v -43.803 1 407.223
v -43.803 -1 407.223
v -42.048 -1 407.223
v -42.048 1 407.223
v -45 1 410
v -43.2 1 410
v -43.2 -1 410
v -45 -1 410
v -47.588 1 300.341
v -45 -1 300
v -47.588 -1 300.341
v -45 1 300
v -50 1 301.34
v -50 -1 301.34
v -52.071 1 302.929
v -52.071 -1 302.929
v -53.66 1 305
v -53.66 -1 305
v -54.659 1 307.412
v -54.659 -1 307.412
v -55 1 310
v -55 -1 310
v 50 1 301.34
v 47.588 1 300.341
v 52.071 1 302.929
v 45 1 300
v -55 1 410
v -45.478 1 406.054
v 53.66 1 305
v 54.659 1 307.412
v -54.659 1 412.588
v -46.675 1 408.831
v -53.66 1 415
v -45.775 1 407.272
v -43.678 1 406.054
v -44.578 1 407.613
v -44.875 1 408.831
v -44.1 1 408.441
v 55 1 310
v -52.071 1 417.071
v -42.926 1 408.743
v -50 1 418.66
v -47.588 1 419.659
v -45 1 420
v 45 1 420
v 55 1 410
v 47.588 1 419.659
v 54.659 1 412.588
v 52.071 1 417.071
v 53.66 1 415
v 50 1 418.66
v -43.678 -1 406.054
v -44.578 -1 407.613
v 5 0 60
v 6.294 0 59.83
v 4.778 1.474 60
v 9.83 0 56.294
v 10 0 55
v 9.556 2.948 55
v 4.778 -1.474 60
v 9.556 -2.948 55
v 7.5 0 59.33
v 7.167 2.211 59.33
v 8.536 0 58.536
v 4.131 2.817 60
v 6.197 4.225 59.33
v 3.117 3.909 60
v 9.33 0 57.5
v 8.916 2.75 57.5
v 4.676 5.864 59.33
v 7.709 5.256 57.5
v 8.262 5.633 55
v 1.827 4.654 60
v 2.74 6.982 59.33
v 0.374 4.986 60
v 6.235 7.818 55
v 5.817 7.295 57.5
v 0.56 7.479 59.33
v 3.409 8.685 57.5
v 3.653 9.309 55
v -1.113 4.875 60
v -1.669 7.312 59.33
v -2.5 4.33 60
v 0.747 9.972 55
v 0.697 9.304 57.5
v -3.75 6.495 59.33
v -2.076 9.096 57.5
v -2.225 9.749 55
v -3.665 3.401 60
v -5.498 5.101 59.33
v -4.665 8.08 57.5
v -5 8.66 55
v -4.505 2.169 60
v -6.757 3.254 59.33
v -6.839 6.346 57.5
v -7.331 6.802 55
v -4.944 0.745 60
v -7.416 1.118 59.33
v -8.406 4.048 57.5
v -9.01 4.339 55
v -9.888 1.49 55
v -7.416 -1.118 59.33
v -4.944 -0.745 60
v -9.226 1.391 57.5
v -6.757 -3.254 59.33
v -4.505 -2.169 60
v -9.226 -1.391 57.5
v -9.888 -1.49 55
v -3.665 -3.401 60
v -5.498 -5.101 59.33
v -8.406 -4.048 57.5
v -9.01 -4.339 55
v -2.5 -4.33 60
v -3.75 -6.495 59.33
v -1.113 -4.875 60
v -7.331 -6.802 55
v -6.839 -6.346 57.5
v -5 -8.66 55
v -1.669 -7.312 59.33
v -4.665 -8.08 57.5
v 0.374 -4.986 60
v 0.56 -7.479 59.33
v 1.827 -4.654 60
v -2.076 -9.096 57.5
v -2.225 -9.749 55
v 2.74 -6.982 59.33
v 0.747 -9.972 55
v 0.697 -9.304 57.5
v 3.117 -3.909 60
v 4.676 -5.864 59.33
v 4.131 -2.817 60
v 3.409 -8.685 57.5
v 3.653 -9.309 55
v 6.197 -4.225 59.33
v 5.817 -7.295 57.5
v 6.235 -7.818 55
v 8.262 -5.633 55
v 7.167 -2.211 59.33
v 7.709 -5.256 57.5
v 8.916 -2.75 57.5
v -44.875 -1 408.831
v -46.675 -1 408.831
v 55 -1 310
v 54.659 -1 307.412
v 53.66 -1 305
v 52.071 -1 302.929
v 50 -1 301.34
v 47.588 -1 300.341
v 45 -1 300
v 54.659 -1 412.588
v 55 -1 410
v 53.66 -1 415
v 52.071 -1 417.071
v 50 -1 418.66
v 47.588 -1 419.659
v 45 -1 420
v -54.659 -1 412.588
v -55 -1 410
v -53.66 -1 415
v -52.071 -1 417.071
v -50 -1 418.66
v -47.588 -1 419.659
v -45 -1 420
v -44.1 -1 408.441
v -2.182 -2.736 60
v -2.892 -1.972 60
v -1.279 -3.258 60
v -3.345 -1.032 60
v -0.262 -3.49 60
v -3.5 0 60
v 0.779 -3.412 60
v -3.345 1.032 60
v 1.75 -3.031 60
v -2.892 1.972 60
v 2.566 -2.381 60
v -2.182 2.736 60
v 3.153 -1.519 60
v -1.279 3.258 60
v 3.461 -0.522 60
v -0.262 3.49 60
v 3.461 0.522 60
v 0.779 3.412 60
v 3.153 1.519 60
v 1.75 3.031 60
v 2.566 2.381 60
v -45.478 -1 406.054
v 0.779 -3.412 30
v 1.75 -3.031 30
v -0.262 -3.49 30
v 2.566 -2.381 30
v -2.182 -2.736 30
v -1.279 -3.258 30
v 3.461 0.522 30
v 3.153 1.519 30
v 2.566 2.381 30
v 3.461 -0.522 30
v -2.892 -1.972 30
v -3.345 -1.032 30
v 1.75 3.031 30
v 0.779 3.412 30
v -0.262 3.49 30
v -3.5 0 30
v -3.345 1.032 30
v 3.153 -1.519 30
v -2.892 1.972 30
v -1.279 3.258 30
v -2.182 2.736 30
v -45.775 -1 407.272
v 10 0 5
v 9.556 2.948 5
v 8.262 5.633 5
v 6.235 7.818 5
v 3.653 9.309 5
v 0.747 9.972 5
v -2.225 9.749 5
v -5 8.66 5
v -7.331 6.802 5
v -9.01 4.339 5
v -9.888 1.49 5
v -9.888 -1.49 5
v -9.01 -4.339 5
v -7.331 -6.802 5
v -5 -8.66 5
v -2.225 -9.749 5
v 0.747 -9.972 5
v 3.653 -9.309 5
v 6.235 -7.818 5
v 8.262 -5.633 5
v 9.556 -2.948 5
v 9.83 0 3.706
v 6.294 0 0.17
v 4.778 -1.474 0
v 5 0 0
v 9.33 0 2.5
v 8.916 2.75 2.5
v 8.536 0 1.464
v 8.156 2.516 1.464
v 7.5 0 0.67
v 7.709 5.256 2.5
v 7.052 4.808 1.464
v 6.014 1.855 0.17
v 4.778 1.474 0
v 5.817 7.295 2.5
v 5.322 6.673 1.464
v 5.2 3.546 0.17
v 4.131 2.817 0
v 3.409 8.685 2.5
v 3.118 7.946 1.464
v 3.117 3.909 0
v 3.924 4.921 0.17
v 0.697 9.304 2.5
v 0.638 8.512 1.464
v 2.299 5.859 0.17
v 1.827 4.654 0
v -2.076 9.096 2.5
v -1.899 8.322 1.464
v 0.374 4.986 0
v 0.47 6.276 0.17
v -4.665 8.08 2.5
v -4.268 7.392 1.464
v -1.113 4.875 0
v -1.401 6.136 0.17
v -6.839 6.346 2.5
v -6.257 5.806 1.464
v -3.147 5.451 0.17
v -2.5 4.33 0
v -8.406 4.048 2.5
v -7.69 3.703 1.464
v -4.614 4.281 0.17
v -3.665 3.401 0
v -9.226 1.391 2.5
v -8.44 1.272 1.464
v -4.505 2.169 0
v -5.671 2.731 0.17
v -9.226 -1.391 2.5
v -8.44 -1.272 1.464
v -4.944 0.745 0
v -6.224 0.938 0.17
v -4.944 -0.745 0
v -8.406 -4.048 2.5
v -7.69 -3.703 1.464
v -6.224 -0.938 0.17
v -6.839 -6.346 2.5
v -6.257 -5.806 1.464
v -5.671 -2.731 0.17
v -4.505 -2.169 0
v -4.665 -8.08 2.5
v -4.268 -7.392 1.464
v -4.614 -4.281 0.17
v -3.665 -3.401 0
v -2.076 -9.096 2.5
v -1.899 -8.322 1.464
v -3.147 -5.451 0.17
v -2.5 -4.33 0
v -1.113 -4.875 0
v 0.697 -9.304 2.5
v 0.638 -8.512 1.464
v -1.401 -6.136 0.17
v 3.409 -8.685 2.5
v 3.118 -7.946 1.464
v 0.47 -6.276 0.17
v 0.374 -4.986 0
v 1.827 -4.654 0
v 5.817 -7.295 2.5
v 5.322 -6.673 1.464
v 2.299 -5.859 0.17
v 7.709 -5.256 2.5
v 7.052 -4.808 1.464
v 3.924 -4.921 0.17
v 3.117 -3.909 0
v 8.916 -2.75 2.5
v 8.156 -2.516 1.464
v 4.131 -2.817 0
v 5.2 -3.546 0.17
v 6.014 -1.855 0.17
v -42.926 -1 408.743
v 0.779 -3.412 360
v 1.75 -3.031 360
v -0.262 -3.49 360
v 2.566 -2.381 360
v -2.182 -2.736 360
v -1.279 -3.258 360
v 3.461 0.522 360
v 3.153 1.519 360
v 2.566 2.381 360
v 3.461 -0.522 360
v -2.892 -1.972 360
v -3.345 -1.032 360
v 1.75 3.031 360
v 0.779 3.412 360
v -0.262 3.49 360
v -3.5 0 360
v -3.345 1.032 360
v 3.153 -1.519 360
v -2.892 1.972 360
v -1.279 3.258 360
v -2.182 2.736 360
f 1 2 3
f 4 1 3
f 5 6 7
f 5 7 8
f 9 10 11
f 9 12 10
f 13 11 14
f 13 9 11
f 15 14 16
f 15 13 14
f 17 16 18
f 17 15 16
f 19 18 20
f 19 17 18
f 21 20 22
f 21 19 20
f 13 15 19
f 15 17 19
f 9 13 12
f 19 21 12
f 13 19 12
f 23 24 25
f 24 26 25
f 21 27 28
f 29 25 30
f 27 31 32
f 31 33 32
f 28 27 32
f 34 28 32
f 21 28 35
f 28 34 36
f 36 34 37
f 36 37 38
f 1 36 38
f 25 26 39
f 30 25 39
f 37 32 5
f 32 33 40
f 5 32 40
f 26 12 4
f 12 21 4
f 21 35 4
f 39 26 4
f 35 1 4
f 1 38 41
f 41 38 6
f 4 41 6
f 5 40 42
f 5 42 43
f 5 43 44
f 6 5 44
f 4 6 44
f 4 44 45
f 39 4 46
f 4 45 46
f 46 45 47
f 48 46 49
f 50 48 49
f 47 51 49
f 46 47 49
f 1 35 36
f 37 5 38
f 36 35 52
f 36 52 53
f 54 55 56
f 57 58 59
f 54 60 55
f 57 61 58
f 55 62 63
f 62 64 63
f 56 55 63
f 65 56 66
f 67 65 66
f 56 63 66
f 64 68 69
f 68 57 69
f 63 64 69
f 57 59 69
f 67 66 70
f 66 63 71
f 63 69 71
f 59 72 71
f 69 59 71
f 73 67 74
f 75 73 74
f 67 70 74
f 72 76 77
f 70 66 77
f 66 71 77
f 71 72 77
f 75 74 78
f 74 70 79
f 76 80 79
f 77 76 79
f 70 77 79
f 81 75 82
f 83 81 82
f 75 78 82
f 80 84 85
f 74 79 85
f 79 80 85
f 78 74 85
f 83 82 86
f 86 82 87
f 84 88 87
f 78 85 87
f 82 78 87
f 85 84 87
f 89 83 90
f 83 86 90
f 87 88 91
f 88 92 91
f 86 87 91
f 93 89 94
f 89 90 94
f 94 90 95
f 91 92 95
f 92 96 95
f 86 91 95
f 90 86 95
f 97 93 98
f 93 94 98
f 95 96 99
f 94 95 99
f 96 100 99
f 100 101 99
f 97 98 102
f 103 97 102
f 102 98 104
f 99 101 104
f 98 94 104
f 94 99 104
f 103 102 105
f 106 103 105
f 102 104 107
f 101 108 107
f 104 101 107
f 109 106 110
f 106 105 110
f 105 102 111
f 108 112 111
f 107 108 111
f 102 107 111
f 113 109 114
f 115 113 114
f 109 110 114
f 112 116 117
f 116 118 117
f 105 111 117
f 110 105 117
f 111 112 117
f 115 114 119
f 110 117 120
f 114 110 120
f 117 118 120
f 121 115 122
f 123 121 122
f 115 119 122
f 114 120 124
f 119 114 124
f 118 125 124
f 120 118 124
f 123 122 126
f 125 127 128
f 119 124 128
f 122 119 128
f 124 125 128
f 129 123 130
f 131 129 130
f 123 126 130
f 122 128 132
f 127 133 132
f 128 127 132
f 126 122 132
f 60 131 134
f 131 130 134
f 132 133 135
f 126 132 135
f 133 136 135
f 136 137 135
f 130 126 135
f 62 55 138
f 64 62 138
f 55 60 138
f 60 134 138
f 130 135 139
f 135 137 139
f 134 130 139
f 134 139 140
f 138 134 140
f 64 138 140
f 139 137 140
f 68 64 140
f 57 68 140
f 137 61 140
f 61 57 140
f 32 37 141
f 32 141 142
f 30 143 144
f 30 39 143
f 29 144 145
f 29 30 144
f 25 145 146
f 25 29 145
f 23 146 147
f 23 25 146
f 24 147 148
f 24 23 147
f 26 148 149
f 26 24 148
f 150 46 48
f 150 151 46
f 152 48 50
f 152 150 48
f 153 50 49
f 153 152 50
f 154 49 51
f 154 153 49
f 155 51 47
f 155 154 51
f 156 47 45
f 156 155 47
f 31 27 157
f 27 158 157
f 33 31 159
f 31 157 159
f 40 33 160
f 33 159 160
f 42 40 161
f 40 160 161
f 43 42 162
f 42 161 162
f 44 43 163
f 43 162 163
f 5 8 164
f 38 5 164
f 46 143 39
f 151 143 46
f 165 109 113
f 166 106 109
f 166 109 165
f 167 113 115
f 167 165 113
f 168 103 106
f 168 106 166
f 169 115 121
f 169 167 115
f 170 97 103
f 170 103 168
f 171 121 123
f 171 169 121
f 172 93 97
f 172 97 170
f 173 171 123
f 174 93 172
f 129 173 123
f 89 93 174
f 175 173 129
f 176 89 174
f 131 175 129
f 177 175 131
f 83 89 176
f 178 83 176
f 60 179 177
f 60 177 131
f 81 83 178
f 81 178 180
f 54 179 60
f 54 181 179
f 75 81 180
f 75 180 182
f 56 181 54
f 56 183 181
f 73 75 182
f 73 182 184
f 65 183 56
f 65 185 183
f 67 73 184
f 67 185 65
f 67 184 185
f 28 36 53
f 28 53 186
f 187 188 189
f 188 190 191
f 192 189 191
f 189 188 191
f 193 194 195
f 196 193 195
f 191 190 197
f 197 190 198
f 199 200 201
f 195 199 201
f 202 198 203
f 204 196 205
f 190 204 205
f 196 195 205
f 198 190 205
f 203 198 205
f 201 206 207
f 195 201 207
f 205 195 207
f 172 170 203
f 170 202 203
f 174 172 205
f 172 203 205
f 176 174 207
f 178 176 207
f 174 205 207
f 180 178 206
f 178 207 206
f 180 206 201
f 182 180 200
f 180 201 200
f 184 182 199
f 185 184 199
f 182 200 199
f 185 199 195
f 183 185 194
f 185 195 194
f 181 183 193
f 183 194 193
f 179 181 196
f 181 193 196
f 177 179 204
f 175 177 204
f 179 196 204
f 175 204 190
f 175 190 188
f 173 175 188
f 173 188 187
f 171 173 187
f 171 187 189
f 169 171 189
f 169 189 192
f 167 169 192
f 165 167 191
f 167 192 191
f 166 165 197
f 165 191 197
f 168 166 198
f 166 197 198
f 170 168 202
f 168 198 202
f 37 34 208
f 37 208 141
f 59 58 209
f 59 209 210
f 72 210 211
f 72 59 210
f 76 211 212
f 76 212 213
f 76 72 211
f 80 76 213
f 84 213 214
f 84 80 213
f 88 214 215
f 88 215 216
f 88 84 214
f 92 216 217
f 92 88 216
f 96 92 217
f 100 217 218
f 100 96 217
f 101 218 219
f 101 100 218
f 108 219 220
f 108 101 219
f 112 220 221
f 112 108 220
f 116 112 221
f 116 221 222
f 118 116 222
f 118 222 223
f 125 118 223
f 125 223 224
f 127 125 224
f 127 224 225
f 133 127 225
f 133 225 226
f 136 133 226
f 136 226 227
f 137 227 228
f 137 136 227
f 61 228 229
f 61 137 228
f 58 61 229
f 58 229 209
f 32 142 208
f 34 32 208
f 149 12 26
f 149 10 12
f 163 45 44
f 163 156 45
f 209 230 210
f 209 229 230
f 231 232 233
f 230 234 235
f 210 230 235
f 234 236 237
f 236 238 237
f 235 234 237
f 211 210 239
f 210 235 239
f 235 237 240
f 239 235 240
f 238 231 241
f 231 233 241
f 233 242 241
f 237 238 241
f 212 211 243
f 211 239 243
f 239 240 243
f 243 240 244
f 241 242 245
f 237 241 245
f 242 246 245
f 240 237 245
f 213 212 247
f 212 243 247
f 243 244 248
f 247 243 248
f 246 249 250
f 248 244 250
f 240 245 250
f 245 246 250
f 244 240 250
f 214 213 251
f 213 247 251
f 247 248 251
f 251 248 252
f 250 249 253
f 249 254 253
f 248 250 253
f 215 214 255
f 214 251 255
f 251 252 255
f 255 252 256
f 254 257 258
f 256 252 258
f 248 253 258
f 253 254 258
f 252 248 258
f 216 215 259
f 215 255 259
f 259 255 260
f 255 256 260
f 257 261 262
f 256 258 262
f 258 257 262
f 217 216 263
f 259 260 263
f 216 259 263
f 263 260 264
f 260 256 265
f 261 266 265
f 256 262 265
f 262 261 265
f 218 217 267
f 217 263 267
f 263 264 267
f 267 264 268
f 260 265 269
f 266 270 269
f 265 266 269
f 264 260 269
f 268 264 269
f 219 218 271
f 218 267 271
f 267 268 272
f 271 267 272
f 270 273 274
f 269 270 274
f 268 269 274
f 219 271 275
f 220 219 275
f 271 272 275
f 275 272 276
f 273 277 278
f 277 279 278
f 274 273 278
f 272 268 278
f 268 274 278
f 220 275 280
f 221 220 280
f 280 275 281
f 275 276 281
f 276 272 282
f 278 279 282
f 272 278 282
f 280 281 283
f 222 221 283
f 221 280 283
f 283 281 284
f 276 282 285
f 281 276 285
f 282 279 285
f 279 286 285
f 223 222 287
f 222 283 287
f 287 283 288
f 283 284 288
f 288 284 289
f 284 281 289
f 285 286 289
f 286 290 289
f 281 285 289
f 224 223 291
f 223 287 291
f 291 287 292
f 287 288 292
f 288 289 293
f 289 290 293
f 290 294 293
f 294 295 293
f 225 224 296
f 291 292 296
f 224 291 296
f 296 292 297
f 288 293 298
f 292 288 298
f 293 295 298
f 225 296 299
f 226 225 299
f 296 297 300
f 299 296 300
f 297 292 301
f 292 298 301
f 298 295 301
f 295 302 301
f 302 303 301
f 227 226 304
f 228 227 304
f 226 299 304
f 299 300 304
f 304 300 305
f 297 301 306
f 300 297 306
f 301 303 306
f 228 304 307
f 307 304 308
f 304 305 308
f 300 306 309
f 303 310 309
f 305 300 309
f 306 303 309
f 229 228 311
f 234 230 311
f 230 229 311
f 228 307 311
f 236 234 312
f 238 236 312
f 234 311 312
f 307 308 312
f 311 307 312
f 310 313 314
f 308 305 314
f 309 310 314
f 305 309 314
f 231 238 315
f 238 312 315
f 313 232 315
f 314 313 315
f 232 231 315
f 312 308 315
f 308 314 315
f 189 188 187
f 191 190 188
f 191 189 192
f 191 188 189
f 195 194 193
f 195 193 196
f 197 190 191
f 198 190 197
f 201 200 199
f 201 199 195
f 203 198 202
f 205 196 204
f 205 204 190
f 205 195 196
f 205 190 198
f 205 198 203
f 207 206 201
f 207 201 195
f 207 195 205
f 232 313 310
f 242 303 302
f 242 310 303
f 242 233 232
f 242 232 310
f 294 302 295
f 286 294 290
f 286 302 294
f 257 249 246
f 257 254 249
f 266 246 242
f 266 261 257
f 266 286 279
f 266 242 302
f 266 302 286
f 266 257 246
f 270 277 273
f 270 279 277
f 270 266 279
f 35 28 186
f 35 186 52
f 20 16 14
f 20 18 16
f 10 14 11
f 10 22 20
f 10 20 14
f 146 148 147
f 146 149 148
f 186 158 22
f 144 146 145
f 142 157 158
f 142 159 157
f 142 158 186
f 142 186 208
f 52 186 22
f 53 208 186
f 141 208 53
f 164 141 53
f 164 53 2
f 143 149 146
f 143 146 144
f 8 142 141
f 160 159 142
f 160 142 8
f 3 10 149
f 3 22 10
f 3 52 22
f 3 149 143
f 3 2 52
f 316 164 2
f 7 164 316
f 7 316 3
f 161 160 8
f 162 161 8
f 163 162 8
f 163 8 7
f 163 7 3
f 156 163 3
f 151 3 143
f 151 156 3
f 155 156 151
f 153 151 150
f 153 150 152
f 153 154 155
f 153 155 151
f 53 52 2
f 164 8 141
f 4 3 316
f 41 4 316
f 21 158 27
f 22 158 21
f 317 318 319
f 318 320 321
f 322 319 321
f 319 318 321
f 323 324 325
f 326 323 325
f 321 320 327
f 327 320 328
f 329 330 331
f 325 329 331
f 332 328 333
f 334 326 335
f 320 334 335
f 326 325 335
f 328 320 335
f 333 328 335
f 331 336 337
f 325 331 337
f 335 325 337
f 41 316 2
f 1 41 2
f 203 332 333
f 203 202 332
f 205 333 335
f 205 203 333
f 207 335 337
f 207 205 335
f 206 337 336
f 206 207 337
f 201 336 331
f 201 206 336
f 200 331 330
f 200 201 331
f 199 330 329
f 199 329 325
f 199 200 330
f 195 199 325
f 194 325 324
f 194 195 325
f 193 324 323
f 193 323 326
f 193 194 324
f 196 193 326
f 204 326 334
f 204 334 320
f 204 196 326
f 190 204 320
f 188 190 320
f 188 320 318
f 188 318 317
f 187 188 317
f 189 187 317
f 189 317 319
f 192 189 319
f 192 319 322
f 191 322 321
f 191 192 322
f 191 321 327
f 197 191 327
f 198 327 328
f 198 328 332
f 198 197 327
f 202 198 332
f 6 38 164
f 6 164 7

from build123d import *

# Parameters (mm, degrees)
F0_W     = 3.5
F0_H     = 60
F4_DEPTH = 1
F5_R     = 10
F6_R     = 5
F8_DEPTH = 12.5


with BuildPart() as f1:
    # F0 (on Front) → F1 (revolve)
    with BuildSketch(Plane.XZ):
        with Locations((-1.75, 330)):
            Rectangle(F0_W, F0_H)
        Polygon((0, 60), (0, 300), (-3.5, 300), (-3.5, 30), (0, 30), align=None)
    revolve(axis=Axis((0, 0, 195), (0, 0, -1)))


with BuildPart() as f2:
    # F0 (on Front) → F2 (revolve)
    with BuildSketch(Plane.XZ):
        Polygon((10, 60), (0, 60), (0, 30), (0, 0), (10, 0), align=None)
    revolve(axis=Axis((0, 0, 30), (0, 0, 1)))

    # F3: cut F1
    add(f1.part, mode=Mode.SUBTRACT)

    # F6
    f6_edges = [f2.edges().sort_by_distance(p)[0] for p in [
        (-10, 0, 60),
        (-10, 0, 0),
    ]]
    fillet(f6_edges, radius=F6_R)


with BuildPart() as f4:
    # F0 (on Front) → F4 (new body, symmetric)
    with BuildSketch(Plane.XZ):
        Polygon((55, 300), (55, 420), (-55, 420), (-55, 300), (-3.5, 300), (-3.5, 360), (0, 360), (0, 300), align=None)
        with Locations((-1.75, 330)):
            Rectangle(F0_W, F0_H)
    extrude(amount=F4_DEPTH, both=True)

    # F5
    f5_edges = [f4.edges().sort_by_distance(p)[0] for p in [
        (-55, 0, 420),
        (55, 0, 420),
        (-55, 0, 300),
        (55, 0, 300),
    ]]
    fillet(f5_edges, radius=F5_R)

    # F7 (on Front) → F8 (cut, symmetric)
    with BuildSketch(Plane.XZ):
        Polygon((-43.2, 410), (-45, 410), (-44.1, 408.441154), align=None)
        Polygon((-44.875, 408.830866), (-46.675, 408.830866), (-45.775, 407.27202), align=None)
        Polygon((-43.678195, 406.05405), (-44.578195, 407.612895), (-45.478195, 406.05405), align=None)
        Polygon((-42.048205, 407.223184), (-42.9257, 408.74305), (-43.803195, 407.223184), align=None)
    extrude(amount=F8_DEPTH, both=True, mode=Mode.SUBTRACT)


solid = Compound([f1.part, f2.part, f4.part])
